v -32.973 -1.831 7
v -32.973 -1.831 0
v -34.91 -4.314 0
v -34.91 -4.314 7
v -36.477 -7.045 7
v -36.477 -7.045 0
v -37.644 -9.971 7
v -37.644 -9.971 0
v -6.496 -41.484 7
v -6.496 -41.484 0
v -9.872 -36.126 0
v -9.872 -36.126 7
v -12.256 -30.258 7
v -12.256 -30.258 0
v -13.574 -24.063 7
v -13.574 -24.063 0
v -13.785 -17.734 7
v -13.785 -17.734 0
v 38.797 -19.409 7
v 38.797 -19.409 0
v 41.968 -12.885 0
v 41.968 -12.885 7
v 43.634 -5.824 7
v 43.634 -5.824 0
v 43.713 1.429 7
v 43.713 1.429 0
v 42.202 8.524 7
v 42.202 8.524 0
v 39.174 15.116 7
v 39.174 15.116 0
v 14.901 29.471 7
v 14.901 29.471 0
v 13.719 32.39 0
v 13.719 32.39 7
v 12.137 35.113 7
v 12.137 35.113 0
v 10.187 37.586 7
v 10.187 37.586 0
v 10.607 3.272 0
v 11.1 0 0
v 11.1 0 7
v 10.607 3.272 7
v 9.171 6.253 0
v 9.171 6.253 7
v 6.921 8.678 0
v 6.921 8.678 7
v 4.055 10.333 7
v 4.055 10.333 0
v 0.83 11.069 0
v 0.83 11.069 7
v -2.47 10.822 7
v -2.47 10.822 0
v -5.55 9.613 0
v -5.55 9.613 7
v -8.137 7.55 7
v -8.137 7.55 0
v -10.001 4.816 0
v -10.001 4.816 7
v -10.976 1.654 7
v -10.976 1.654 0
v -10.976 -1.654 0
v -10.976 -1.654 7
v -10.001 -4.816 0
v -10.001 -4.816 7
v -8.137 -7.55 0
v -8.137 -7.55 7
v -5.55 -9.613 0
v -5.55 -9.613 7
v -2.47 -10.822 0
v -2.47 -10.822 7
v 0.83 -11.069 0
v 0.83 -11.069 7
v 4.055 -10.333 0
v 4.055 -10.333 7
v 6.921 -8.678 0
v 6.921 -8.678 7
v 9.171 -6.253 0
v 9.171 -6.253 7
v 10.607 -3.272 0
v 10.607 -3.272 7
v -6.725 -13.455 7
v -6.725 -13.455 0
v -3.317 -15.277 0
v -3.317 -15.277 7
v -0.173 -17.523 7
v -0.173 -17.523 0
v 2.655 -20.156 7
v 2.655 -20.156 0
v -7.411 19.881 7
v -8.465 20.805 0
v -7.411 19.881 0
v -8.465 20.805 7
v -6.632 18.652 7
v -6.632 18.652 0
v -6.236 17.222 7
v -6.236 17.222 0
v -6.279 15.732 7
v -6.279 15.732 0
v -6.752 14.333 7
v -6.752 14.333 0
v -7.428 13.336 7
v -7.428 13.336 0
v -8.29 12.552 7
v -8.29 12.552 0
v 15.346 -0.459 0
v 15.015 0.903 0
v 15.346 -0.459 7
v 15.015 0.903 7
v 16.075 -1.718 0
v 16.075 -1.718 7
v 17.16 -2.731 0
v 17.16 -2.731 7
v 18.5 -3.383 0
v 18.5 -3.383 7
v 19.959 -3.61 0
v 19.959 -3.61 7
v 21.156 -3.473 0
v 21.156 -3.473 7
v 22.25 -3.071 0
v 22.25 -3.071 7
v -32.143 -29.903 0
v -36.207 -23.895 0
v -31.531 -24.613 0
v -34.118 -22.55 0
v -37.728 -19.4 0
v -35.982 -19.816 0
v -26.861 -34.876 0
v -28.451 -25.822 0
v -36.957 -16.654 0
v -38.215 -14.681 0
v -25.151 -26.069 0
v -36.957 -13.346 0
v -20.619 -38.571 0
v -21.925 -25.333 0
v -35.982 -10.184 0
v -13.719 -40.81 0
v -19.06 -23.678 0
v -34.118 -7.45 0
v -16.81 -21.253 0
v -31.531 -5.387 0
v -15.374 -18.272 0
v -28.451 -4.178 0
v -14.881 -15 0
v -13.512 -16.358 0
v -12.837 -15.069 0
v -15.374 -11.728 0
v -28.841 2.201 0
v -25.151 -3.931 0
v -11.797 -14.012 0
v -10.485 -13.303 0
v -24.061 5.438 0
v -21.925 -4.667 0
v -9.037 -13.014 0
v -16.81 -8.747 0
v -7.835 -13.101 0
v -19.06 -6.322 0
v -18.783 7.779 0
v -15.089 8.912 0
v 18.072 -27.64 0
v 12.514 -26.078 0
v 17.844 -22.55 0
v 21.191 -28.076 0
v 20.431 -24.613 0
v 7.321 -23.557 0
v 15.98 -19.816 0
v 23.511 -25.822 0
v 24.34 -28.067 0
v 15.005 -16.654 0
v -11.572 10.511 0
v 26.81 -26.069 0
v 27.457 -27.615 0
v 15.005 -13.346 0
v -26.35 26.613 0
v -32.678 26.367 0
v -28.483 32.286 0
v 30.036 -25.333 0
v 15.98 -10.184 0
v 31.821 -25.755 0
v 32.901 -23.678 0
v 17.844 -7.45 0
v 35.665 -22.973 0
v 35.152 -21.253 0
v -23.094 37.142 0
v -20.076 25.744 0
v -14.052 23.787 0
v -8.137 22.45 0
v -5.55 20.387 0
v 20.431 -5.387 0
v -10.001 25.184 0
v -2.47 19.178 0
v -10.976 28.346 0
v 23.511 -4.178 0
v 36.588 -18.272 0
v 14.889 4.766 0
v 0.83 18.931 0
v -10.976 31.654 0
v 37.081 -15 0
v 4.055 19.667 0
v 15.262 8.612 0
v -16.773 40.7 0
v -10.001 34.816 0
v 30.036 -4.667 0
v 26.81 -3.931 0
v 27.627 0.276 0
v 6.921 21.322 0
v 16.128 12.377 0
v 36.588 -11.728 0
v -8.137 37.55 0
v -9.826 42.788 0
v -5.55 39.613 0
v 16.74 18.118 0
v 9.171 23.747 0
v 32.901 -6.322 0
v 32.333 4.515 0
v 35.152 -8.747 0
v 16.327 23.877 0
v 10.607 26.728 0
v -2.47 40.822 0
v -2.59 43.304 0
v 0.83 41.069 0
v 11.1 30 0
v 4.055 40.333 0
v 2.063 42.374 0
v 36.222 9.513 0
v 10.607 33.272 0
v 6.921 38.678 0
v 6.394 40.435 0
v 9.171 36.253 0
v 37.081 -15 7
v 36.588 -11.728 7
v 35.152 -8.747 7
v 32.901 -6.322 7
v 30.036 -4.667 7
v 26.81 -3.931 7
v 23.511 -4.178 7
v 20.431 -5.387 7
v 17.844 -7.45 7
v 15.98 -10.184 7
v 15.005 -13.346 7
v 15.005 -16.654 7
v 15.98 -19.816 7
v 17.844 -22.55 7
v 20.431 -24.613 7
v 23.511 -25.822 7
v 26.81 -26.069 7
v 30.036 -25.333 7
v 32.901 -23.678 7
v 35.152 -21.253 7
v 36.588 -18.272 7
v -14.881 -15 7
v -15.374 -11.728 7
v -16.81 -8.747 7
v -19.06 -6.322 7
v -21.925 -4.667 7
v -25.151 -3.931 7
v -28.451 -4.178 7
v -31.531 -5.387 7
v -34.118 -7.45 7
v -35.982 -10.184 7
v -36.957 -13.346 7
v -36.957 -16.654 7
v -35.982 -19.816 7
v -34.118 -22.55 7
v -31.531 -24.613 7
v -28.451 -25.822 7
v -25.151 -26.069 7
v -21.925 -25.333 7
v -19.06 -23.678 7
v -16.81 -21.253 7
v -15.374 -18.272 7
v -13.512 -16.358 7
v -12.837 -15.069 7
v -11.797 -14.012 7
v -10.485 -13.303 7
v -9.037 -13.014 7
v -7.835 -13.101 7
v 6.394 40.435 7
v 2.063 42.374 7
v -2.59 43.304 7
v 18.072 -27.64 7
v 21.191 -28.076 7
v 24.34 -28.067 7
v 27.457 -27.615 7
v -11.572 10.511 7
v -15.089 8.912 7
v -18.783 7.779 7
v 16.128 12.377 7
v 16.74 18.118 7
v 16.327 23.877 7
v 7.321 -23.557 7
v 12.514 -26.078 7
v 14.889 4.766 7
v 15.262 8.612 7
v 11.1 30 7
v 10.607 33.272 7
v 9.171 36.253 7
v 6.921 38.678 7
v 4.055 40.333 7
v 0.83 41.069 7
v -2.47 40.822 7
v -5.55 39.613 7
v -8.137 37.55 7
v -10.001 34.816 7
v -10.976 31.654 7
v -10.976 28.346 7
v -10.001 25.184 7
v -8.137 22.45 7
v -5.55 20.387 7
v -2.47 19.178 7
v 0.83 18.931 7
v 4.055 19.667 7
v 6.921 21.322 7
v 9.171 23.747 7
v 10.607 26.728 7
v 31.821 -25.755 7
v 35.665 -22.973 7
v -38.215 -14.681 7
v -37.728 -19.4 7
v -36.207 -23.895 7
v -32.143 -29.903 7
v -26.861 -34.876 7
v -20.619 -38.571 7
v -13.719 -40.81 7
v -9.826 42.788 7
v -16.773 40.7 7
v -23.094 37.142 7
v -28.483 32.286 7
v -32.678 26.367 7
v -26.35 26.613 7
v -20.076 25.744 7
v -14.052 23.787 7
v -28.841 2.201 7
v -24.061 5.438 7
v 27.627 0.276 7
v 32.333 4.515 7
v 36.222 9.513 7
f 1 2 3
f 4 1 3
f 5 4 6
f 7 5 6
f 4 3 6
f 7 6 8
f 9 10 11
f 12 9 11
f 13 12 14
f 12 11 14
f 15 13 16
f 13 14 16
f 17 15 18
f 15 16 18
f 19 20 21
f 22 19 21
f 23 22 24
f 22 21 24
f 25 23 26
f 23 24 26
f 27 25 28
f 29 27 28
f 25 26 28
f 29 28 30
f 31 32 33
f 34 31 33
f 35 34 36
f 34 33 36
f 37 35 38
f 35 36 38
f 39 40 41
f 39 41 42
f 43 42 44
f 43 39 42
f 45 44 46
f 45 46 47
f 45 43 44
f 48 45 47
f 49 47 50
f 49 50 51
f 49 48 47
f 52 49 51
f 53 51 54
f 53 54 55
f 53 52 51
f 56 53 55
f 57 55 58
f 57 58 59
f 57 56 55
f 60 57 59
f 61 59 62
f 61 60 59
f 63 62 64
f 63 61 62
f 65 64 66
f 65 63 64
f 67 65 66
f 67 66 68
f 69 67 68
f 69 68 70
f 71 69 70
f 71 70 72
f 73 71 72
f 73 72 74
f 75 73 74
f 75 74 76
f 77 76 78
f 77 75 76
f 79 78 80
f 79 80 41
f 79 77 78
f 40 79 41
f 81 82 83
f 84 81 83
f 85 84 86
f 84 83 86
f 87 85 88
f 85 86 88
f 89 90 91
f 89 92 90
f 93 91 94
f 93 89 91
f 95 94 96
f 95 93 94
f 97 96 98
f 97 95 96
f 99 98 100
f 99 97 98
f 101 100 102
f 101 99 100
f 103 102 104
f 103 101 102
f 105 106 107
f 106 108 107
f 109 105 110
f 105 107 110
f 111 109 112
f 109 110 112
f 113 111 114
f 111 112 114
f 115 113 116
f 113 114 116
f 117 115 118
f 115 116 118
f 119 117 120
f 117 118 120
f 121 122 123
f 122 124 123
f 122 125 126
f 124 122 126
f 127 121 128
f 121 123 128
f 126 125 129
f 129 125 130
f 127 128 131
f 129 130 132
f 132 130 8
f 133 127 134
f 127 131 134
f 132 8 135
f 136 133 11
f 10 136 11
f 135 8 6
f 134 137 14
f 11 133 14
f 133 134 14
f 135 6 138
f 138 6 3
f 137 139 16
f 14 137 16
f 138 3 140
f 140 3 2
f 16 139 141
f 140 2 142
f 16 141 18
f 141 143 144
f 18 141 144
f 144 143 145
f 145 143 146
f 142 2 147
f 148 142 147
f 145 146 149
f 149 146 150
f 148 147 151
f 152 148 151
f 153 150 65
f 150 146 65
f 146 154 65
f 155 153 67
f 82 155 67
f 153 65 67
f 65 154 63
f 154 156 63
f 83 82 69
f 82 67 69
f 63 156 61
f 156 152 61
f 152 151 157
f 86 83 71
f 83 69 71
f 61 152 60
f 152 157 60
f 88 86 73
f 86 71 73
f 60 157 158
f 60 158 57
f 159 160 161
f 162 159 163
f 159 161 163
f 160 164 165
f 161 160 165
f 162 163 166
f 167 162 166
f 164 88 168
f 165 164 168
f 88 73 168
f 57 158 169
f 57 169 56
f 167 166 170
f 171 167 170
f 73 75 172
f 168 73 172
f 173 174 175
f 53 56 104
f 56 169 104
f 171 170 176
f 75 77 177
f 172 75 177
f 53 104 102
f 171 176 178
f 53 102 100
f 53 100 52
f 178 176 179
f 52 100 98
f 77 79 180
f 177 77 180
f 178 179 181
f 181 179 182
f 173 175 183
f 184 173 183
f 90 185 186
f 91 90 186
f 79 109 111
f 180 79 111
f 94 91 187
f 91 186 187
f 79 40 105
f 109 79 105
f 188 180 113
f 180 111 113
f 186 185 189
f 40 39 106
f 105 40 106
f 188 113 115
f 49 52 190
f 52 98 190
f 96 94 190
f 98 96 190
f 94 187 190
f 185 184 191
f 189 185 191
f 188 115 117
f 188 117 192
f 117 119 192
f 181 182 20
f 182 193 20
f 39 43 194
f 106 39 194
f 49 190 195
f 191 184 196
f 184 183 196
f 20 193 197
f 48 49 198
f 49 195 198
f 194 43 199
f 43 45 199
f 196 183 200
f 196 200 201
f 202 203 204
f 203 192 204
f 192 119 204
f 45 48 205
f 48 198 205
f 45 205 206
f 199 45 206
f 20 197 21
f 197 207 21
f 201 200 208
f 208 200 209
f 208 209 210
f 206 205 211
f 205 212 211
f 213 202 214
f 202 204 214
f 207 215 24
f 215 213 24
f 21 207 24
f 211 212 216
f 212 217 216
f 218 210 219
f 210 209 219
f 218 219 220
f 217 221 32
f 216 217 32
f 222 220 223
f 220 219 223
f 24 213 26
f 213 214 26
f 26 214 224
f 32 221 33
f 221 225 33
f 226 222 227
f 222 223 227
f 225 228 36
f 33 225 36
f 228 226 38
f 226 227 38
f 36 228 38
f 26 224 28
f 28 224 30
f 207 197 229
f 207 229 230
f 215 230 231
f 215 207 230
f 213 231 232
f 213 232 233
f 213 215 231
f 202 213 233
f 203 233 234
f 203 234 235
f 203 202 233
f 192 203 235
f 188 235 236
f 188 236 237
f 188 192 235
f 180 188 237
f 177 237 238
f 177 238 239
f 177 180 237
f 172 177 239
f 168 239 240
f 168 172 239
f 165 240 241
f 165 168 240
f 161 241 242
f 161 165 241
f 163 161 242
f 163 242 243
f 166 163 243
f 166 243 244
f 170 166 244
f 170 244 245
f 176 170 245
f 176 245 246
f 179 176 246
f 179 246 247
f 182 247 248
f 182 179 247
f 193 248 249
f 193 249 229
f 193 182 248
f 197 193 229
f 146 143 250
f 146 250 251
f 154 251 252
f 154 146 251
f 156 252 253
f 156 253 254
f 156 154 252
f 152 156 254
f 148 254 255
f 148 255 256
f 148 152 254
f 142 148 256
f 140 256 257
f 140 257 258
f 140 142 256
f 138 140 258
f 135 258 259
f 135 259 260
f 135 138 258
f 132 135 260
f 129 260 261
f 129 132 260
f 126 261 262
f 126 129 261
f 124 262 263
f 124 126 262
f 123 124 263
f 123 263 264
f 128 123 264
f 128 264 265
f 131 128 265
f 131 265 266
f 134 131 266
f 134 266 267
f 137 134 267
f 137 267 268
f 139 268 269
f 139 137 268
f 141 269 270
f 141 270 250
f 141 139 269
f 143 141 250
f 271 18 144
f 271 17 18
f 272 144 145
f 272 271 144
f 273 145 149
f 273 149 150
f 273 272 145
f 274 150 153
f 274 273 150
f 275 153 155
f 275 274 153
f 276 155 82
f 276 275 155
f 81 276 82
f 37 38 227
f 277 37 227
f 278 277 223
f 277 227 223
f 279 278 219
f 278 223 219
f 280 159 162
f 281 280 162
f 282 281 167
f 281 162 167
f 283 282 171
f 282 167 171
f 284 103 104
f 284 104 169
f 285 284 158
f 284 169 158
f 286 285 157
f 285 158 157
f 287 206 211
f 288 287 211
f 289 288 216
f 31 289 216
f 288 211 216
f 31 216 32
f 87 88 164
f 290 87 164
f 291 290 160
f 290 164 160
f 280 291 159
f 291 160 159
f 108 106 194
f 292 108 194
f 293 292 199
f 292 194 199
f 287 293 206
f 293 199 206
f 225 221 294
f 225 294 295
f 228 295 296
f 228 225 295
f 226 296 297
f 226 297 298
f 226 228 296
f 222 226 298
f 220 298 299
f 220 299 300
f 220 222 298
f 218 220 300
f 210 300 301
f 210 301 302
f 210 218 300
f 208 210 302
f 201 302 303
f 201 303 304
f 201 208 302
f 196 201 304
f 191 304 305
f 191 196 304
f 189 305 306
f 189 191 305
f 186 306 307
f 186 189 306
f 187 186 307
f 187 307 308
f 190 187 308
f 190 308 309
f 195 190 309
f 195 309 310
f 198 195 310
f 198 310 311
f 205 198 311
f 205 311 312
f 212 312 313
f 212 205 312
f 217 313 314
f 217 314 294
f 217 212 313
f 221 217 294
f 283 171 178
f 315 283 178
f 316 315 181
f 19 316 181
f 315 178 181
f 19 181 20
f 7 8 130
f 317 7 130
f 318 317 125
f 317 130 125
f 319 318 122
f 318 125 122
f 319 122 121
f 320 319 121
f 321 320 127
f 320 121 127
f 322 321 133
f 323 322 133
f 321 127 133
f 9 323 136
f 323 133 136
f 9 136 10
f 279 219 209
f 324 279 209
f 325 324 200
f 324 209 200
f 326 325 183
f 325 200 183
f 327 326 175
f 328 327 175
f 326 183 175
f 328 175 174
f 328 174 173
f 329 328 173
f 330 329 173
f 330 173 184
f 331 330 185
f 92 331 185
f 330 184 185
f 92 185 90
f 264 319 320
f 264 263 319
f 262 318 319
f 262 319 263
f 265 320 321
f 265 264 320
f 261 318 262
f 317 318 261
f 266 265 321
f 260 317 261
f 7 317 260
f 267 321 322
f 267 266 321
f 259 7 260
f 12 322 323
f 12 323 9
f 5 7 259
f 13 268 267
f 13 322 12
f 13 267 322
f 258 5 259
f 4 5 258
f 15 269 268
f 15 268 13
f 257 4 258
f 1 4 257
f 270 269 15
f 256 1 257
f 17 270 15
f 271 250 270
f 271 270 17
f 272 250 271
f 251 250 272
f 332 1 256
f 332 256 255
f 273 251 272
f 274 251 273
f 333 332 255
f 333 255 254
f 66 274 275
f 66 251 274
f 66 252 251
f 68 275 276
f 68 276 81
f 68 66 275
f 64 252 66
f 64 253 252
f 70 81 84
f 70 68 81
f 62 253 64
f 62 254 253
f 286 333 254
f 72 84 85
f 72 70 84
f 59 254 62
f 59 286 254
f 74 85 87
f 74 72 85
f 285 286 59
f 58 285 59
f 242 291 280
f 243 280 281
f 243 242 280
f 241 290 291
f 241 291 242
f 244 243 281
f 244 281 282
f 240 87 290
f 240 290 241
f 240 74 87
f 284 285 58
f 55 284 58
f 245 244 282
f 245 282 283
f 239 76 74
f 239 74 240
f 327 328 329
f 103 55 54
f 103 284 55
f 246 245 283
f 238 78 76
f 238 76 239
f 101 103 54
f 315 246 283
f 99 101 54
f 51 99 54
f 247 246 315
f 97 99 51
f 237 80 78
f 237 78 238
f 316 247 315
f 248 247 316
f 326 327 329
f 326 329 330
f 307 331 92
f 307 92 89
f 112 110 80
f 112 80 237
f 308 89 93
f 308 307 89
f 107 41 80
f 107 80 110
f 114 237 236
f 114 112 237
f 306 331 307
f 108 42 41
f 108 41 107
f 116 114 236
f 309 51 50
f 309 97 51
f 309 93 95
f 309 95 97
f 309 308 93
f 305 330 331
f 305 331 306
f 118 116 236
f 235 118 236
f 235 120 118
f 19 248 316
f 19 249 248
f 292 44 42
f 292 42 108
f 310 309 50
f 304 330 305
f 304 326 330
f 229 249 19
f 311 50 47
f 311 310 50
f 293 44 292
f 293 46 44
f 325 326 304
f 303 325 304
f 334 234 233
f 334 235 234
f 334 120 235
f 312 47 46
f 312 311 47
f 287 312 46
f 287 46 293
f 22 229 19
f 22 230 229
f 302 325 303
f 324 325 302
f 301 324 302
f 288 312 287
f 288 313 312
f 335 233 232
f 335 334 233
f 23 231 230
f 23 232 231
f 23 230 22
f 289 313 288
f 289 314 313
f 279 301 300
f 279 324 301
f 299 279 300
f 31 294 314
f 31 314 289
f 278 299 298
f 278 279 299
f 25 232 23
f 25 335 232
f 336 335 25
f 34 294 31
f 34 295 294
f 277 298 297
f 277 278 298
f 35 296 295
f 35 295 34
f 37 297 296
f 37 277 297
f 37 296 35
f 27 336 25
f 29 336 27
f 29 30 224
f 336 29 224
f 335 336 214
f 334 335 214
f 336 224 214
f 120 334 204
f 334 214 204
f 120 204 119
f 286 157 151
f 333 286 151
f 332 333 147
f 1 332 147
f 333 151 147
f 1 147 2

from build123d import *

# Parameters (mm, degrees)
F0_R     = 11.1
F1_DEPTH = 7
F2_R     = 5
F3_R     = 5
F4_R     = 5


with BuildPart() as f1:
    # F0 (on Top) → F1 (new body)
    with BuildSketch(Plane.XY):
        with BuildLine():
            ThreePointArc((10.187081, 37.585558), (4.282363, 41.525705), (-2.589889, 43.304074))
            ThreePointArc((-2.589889, 43.304074), (-20.0319, 39.095625), (-32.678202, 26.367472))
            ThreePointArc((-32.678202, 26.367472), (-17.005905, 24.893365), (-3.464991, 16.866068))
            ThreePointArc((-3.464991, 16.866068), (-10.431292, 11.154526), (-18.783352, 7.779))
            ThreePointArc((-18.783352, 7.779), (-26.523062, 3.92607), (-32.973144, -1.831066))
            ThreePointArc((-32.973144, -1.831066), (-35.741861, -5.652046), (-37.643589, -9.970508))
            ThreePointArc((-37.643589, -9.970508), (-38.103497, -17.054217), (-36.207484, -23.894947))
            ThreePointArc((-36.207484, -23.894947), (-23.841854, -36.895947), (-6.4958, -41.483889))
            ThreePointArc((-6.4958, -41.483889), (-13.055333, -27.174228), (-12.873948, -11.433804))
            ThreePointArc((-12.873948, -11.433804), (-4.444456, -14.611027), (2.654864, -20.15636))
            ThreePointArc((2.654864, -20.15636), (9.861454, -24.932681), (18.072322, -27.640047))
            ThreePointArc((18.072322, -27.640047), (22.765746, -28.127337), (27.456508, -27.61505))
            ThreePointArc((27.456508, -27.61505), (33.821134, -24.471488), (38.797373, -19.409127))
            ThreePointArc((38.797373, -19.409127), (43.873754, -2.199678), (39.174002, 15.116417))
            ThreePointArc((39.174002, 15.116417), (30.061239, 2.280864), (16.338939, -5.432264))
            ThreePointArc((16.338939, -5.432264), (14.875749, 3.456501), (16.128488, 12.37736))
            ThreePointArc((16.128488, 12.37736), (16.661608, 21.00661), (14.900822, 29.471114))
            ThreePointArc((14.900822, 29.471114), (12.976115, 33.779383), (10.187081, 37.585558))
        make_face()
        with Locations((-25.980762, -15)):
            Circle(F0_R, mode=Mode.SUBTRACT)
        Circle(F0_R, mode=Mode.SUBTRACT)
        with Locations((25.980762, -15)):
            Circle(F0_R, mode=Mode.SUBTRACT)
        with Locations((0, 30)):
            Circle(F0_R, mode=Mode.SUBTRACT)
    extrude(amount=F1_DEPTH)

    # F2
    f2_edges = [f1.edges().sort_by_distance(p)[0] for p in [
        (16.338939, -5.432264, 3.5),
    ]]
    fillet(f2_edges, radius=F2_R)

    # F3
    f3_edges = [f1.edges().sort_by_distance(p)[0] for p in [
        (-3.464991, 16.866068, 3.5),
    ]]
    fillet(f3_edges, radius=F3_R)

    # F4
    f4_edges = [f1.edges().sort_by_distance(p)[0] for p in [
        (-12.873948, -11.433804, 3.5),
    ]]
    fillet(f4_edges, radius=F4_R)


solid = f1.part
